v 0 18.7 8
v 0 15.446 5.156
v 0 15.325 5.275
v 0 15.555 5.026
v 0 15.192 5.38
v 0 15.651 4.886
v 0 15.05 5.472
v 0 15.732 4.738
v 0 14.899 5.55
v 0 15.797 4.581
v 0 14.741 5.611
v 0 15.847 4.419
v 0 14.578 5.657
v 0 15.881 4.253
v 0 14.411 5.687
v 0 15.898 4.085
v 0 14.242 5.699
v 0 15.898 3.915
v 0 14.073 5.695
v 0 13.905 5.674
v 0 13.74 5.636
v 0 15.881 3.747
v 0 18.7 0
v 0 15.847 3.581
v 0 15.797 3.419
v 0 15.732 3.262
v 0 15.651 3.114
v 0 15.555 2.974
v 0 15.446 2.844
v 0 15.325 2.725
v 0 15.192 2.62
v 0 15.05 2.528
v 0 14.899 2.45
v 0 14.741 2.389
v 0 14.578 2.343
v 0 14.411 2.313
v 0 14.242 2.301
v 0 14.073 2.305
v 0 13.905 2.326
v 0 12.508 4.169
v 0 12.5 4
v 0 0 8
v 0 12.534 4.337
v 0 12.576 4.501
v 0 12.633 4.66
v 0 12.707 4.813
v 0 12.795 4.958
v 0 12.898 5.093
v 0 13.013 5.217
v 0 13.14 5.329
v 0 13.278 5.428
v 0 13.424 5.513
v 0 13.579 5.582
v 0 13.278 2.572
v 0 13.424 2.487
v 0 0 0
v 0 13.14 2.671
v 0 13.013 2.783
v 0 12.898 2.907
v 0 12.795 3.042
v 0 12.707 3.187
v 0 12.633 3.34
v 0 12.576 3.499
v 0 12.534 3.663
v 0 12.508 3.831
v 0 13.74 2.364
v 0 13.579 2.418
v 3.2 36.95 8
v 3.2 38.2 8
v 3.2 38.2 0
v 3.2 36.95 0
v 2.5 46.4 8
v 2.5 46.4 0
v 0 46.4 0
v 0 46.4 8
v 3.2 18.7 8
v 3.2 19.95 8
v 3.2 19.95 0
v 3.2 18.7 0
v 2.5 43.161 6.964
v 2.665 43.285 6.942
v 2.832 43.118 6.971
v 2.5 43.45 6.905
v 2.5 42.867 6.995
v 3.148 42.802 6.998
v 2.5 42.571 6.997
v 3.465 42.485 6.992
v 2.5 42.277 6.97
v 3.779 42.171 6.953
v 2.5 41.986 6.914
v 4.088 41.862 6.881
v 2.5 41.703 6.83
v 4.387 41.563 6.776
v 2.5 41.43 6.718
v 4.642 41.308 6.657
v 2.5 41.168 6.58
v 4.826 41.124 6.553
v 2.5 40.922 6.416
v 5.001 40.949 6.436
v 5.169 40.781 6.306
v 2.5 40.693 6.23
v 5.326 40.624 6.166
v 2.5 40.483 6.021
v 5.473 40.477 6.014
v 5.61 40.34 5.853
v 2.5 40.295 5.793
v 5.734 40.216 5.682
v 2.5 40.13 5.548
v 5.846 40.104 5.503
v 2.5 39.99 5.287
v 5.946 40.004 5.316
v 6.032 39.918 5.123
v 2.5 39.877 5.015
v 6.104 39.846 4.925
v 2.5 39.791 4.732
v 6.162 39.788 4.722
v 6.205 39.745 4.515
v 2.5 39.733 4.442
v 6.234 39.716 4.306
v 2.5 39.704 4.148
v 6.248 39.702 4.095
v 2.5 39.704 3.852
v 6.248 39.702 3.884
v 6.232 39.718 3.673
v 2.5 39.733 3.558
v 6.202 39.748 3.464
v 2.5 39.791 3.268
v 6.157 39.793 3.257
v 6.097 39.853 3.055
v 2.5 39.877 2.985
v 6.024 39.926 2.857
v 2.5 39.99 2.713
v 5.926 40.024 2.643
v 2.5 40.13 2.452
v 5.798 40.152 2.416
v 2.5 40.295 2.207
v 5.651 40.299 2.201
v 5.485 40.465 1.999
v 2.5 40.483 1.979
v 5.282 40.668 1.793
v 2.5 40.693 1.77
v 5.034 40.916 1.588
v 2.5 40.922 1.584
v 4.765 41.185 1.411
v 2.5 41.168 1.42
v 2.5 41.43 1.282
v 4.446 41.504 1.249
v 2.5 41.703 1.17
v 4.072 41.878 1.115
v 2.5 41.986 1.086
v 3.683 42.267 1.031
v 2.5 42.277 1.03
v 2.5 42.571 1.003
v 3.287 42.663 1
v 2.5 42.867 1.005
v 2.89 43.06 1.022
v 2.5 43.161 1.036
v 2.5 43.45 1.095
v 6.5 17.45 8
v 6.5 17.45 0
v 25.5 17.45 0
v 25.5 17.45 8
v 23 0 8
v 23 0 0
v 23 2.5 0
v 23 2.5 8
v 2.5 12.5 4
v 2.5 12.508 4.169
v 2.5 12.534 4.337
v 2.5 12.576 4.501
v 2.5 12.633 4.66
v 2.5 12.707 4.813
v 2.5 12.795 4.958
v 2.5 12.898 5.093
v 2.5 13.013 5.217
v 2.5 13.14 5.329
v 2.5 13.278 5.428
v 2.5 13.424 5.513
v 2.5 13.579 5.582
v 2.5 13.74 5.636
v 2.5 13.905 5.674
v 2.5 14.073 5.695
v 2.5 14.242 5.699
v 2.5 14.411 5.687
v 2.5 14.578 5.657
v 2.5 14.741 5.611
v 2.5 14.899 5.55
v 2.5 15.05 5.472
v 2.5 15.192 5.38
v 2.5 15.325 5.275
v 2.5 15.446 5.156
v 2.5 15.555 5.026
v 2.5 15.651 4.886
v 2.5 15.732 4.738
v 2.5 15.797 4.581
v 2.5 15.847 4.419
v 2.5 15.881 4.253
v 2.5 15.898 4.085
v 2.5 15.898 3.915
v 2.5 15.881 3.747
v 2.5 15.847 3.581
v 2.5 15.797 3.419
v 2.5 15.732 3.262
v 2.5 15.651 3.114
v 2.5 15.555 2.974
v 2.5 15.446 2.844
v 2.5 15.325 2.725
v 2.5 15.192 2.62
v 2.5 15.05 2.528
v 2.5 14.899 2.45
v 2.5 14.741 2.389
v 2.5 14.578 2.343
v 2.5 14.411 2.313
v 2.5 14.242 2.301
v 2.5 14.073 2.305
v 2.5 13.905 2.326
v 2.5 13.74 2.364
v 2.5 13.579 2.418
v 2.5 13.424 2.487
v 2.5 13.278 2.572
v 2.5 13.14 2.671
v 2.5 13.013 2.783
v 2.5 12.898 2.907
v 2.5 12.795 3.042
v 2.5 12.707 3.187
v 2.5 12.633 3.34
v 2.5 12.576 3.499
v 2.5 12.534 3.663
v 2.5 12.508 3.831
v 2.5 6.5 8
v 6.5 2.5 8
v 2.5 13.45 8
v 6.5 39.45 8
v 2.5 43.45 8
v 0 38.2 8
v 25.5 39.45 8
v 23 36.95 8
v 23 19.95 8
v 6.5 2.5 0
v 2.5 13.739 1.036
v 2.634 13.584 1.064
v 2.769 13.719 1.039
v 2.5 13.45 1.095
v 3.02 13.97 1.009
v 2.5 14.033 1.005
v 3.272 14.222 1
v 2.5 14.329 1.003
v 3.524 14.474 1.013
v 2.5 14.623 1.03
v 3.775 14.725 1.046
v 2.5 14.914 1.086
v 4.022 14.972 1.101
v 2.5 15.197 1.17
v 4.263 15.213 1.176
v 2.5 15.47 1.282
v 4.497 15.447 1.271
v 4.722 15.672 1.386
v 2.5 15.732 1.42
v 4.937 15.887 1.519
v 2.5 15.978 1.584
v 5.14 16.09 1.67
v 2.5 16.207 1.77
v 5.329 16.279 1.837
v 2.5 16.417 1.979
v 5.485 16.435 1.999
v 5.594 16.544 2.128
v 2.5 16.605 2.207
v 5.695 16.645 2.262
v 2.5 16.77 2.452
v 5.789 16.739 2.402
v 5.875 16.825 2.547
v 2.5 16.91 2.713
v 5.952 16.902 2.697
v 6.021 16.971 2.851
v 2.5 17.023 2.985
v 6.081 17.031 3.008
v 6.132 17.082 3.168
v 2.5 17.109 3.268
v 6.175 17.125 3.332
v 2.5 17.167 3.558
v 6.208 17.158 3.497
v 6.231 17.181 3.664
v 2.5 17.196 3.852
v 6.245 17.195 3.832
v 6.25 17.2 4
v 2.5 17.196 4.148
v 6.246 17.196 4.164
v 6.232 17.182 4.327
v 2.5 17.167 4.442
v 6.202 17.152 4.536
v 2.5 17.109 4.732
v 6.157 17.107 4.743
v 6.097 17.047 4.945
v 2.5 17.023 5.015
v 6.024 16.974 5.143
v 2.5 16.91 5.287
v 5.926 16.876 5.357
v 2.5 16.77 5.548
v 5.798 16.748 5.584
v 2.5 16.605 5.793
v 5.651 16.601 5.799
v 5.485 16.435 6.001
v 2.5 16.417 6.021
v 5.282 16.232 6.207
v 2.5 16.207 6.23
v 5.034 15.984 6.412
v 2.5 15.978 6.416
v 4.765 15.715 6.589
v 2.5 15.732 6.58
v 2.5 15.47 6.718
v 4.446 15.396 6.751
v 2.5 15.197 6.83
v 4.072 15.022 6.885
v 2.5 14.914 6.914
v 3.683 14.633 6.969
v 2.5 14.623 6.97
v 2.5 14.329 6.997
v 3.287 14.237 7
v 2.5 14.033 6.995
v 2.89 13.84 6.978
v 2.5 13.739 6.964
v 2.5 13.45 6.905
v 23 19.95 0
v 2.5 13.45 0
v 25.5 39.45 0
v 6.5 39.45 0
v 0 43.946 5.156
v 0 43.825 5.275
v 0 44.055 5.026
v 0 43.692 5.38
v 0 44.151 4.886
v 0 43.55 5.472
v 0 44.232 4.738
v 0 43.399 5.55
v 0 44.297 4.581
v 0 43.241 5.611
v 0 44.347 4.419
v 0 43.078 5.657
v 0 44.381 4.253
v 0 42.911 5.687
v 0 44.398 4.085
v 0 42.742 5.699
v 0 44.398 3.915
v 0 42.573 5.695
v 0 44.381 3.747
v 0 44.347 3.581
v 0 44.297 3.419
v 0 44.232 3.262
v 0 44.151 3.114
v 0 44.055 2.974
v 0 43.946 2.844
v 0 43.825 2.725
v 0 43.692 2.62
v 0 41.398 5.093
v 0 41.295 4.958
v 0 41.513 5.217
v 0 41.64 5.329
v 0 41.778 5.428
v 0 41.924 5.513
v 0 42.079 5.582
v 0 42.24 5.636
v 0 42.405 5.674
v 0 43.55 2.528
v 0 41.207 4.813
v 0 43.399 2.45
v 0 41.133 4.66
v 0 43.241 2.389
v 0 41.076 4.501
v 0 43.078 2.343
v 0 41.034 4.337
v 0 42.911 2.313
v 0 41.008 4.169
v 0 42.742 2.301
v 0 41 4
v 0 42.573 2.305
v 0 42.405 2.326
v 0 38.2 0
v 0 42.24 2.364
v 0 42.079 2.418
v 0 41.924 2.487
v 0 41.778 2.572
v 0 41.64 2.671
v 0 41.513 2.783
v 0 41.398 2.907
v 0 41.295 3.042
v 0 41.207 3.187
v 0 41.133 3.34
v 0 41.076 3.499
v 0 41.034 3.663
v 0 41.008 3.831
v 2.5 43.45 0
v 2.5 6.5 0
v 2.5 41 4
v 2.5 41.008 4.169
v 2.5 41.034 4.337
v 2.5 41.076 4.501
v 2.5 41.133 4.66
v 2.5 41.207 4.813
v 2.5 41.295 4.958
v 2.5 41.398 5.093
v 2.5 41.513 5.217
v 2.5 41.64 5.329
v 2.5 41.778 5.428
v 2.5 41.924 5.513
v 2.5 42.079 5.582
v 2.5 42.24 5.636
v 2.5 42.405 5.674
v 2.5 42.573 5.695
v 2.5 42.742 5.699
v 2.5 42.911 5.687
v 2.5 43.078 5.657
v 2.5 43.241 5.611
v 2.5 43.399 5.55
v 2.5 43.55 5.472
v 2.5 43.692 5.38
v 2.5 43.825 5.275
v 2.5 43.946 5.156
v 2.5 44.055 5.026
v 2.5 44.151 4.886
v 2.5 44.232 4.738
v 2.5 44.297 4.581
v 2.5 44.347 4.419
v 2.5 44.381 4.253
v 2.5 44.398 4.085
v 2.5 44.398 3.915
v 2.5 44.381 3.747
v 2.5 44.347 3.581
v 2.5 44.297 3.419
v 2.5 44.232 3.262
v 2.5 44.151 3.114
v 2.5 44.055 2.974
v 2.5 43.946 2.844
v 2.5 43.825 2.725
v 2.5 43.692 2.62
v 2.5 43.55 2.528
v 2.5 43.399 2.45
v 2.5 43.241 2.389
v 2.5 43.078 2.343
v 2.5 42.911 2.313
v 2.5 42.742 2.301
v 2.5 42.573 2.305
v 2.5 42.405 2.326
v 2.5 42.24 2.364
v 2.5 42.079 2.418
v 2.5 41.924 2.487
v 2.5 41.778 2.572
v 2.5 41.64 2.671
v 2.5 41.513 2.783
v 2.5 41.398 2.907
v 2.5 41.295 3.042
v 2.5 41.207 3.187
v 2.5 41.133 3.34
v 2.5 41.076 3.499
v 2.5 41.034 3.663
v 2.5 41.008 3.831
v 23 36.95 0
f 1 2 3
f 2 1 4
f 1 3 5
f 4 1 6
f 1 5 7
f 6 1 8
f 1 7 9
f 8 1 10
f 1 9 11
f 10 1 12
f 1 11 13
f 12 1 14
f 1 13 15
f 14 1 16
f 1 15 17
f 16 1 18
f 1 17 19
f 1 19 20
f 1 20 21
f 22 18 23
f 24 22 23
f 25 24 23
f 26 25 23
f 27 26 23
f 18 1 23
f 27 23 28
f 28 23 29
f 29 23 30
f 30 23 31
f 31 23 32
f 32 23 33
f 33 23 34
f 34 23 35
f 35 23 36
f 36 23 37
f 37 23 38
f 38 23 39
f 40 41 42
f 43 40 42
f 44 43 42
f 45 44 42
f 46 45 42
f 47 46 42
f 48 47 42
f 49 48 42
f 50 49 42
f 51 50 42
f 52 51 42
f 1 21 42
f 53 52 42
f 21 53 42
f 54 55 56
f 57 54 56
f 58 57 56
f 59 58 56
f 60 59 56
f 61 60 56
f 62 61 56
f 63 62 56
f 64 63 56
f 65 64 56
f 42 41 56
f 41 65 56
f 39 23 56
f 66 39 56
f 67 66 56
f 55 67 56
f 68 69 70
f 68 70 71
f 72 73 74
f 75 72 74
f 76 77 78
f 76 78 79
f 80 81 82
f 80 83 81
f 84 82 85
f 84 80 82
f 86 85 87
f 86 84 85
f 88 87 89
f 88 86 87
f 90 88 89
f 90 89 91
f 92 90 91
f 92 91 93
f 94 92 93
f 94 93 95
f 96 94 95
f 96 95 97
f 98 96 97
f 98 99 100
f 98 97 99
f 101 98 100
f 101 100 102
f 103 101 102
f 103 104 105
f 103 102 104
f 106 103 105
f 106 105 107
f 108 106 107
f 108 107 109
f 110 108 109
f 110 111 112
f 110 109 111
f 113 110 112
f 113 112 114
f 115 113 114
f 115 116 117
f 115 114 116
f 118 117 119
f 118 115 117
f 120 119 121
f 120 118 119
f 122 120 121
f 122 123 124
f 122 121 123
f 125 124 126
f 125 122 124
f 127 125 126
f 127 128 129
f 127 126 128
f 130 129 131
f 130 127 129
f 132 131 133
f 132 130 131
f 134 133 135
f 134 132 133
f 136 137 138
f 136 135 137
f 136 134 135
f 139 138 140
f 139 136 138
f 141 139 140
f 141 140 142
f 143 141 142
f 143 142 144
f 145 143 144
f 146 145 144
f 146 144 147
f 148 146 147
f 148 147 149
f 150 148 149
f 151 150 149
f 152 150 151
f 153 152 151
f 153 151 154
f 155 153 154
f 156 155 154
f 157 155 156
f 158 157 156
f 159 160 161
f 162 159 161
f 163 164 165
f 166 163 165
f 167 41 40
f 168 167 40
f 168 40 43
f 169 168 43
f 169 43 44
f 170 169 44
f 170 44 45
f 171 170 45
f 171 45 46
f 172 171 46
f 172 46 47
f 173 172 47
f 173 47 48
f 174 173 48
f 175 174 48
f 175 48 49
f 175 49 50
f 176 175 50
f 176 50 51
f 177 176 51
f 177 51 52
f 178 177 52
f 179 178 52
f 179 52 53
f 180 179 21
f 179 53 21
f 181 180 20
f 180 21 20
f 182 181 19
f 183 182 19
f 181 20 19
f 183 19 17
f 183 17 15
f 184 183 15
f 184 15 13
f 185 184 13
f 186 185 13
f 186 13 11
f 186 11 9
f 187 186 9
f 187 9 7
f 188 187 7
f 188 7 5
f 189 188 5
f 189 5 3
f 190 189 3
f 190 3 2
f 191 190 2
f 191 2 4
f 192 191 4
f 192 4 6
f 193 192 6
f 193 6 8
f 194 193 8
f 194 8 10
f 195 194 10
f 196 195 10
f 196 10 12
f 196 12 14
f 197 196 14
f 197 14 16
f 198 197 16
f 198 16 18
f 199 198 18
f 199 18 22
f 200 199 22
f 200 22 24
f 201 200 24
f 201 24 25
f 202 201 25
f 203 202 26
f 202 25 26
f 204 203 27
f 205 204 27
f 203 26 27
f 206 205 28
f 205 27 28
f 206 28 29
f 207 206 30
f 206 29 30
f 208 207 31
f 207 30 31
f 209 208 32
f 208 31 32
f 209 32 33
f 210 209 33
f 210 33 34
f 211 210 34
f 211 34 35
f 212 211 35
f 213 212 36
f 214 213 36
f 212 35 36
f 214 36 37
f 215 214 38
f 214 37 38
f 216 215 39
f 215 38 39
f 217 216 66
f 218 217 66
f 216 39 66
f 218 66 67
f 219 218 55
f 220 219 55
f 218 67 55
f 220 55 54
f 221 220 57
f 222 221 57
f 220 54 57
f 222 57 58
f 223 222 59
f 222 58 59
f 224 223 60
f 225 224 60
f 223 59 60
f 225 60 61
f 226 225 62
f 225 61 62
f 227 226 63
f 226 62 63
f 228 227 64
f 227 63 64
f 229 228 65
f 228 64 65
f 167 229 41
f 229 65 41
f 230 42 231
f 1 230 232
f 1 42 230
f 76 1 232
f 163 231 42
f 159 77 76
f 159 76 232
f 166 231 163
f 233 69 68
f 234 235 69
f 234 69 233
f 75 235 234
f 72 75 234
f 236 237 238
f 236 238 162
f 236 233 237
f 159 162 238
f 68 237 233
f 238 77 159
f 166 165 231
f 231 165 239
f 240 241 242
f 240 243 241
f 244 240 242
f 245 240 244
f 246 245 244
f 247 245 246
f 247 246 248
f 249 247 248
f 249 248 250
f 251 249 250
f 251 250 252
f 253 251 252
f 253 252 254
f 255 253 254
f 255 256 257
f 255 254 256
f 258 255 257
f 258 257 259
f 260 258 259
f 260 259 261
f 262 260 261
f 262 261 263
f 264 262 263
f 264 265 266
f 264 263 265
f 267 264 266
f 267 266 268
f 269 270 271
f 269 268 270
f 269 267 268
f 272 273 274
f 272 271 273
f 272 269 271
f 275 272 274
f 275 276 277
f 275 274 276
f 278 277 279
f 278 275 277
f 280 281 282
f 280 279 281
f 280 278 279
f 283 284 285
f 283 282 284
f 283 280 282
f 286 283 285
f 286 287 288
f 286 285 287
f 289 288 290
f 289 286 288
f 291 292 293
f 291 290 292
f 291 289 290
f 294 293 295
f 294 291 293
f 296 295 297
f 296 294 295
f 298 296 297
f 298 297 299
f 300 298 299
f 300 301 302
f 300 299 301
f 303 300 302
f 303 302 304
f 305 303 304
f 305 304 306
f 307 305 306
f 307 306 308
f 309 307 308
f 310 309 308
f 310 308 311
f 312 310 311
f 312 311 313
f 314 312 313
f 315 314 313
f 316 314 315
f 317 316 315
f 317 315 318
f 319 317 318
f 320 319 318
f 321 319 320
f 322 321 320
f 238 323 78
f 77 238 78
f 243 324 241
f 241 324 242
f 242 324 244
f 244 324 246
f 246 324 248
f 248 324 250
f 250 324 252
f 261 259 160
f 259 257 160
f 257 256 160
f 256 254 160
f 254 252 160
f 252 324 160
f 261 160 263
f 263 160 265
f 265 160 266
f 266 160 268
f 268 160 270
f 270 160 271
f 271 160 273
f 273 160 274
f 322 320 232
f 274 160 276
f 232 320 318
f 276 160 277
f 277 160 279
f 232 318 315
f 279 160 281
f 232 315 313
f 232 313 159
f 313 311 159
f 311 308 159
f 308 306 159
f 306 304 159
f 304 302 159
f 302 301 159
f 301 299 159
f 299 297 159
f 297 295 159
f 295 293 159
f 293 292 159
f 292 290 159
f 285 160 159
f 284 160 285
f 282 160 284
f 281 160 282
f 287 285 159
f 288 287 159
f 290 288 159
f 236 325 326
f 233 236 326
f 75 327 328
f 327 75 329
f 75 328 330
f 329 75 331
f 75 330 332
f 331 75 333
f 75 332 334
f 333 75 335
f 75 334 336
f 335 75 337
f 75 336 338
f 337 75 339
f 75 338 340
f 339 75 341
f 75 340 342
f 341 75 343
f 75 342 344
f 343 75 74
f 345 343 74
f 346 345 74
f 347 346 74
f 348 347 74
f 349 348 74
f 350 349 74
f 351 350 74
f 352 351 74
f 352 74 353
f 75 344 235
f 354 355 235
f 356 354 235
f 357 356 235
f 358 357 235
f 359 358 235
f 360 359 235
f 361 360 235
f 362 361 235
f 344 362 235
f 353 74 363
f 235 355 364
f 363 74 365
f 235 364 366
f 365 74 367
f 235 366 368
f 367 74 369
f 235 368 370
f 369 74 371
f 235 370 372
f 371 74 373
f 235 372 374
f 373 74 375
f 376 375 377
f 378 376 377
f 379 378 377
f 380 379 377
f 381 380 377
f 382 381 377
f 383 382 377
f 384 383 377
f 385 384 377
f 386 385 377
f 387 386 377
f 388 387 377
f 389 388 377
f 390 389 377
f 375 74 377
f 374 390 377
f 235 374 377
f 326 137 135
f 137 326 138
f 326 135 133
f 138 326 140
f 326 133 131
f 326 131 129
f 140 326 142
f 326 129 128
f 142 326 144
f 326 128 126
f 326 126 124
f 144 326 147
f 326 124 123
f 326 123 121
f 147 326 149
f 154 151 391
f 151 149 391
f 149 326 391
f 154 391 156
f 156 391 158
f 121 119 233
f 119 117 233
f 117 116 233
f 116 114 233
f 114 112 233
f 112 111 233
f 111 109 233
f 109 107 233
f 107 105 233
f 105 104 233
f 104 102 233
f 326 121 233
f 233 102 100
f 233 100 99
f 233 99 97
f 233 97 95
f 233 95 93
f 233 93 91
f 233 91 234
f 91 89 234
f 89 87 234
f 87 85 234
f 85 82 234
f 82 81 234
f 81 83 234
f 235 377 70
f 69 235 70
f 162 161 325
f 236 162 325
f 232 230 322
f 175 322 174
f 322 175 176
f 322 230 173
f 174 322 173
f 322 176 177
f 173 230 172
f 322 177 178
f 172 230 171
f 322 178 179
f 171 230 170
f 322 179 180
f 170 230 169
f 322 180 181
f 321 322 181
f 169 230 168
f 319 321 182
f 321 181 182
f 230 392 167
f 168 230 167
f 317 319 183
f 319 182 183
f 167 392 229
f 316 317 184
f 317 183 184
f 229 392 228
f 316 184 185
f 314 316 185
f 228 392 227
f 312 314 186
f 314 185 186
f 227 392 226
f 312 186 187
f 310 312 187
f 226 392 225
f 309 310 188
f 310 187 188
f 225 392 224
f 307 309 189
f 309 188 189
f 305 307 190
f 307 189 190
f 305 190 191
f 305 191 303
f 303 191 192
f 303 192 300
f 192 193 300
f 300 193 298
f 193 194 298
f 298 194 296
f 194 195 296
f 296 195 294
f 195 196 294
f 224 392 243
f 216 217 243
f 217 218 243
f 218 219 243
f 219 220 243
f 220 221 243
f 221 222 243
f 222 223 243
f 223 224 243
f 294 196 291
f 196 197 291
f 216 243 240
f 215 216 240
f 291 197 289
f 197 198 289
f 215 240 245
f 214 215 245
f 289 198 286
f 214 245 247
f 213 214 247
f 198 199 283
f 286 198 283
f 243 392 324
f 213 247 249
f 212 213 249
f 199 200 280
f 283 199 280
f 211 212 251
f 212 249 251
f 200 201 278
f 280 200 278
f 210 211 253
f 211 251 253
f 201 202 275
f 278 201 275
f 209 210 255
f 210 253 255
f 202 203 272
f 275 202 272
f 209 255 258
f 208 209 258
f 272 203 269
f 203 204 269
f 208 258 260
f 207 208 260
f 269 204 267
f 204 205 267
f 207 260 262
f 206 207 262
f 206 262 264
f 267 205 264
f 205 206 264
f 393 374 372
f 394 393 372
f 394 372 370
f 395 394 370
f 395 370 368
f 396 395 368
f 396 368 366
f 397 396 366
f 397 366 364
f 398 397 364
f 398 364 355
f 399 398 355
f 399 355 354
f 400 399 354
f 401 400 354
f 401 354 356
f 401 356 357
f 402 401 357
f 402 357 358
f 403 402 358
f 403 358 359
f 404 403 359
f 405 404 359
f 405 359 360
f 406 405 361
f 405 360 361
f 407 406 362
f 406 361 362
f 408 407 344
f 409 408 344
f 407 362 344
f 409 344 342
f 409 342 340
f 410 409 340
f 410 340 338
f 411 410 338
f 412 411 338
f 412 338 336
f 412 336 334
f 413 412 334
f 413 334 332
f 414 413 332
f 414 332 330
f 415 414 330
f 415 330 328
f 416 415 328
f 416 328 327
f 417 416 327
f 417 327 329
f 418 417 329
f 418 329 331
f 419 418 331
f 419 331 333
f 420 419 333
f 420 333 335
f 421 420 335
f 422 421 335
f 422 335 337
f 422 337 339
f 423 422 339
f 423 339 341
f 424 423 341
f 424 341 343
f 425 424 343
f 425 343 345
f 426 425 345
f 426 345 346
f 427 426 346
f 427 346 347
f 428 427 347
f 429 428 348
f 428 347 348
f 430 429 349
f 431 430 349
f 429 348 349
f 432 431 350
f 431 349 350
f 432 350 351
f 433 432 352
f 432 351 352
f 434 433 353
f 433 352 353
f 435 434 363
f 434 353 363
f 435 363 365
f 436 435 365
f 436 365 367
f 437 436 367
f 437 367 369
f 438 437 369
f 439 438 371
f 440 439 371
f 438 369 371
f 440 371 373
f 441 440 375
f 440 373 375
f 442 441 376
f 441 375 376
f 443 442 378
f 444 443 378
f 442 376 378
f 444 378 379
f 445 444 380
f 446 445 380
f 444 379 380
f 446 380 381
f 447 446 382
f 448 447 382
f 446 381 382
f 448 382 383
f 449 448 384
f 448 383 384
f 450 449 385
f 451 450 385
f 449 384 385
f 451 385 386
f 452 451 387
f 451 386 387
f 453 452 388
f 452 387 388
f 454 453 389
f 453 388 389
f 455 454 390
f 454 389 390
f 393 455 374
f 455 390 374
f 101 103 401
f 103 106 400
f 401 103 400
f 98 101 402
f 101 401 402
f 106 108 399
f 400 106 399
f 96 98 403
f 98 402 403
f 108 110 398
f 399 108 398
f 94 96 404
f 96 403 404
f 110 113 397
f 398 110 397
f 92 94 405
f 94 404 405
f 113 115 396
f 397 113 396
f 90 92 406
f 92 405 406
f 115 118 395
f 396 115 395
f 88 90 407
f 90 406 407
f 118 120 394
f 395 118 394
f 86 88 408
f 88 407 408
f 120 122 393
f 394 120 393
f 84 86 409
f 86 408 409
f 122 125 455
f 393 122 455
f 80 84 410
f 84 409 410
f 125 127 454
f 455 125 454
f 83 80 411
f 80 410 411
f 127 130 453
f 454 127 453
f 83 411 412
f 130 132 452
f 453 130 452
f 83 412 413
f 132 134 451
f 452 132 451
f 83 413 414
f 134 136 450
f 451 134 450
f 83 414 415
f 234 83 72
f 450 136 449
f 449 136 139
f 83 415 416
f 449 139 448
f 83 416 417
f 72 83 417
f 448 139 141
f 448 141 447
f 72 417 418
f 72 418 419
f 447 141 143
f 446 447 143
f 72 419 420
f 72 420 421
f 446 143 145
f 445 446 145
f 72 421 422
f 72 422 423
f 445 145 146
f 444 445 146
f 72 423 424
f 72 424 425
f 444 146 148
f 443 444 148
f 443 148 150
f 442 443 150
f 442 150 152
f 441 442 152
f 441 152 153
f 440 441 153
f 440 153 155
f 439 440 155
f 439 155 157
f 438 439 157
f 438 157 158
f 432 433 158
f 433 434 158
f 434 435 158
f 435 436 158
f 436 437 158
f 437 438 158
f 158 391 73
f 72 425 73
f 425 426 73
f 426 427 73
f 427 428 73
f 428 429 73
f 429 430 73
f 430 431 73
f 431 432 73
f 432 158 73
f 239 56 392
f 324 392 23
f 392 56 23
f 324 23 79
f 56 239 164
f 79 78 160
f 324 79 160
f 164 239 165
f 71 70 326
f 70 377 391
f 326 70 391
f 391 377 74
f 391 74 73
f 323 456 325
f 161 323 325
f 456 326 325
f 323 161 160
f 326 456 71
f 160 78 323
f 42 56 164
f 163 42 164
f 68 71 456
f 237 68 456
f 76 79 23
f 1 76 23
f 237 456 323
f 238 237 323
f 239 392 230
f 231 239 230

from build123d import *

# Parameters (mm, degrees)
PAD_DEPTH       = 8
CHAMFER_SIZE    = 4
SKETCH001_R     = 1.7
POCKET_DEPTH    = 25.501
SKETCH002_R     = 3
POCKET001_DEPTH = 23.001


with BuildPart() as part:
    # Sketch → Pad (new body)
    with BuildSketch(Plane.XY):
        Polygon((0, 0), (23, 0), (23, 2.5), (2.5, 2.5), (2.5, 17.45), (25.5, 17.45), (25.5, 39.45), (2.5, 39.45), (2.5, 46.4), (0, 46.4), (0, 38.2), (3.2, 38.2), (3.2, 36.95), (23, 36.95), (23, 19.95), (3.2, 19.95), (3.2, 18.7), (0, 18.7), align=None)
    extrude(amount=PAD_DEPTH)

    # Chamfer
    chamfer_edges = [part.edges().sort_by_distance(p)[0] for p in [
        (2.5, 17.45, 4),
        (2.5, 39.45, 4),
        (2.5, 2.5, 4),
    ]]
    chamfer(chamfer_edges, length=CHAMFER_SIZE)

    # Sketch001 (on Face9 of Chamfer) → Pocket (cut, through all)
    with BuildSketch(Plane(origin=(0, 0, 0), x_dir=(0, -1, 0), z_dir=(-1, 0, 0))):
        with Locations((-42.7, 4)):
            Circle(SKETCH001_R)
        with Locations((-14.2, 4)):
            Circle(SKETCH001_R)
    extrude(amount=-POCKET_DEPTH, mode=Mode.SUBTRACT)

    # Sketch002 (on Face18 of Pocket) → Pocket001 (cut, through all)
    with BuildSketch(Plane.YZ.offset(2.5)):
        with Locations((14.2, 4)):
            Circle(SKETCH002_R)
        with Locations((42.7, 4)):
            Circle(SKETCH002_R)
    extrude(amount=POCKET001_DEPTH, mode=Mode.SUBTRACT)


solid = part.part
